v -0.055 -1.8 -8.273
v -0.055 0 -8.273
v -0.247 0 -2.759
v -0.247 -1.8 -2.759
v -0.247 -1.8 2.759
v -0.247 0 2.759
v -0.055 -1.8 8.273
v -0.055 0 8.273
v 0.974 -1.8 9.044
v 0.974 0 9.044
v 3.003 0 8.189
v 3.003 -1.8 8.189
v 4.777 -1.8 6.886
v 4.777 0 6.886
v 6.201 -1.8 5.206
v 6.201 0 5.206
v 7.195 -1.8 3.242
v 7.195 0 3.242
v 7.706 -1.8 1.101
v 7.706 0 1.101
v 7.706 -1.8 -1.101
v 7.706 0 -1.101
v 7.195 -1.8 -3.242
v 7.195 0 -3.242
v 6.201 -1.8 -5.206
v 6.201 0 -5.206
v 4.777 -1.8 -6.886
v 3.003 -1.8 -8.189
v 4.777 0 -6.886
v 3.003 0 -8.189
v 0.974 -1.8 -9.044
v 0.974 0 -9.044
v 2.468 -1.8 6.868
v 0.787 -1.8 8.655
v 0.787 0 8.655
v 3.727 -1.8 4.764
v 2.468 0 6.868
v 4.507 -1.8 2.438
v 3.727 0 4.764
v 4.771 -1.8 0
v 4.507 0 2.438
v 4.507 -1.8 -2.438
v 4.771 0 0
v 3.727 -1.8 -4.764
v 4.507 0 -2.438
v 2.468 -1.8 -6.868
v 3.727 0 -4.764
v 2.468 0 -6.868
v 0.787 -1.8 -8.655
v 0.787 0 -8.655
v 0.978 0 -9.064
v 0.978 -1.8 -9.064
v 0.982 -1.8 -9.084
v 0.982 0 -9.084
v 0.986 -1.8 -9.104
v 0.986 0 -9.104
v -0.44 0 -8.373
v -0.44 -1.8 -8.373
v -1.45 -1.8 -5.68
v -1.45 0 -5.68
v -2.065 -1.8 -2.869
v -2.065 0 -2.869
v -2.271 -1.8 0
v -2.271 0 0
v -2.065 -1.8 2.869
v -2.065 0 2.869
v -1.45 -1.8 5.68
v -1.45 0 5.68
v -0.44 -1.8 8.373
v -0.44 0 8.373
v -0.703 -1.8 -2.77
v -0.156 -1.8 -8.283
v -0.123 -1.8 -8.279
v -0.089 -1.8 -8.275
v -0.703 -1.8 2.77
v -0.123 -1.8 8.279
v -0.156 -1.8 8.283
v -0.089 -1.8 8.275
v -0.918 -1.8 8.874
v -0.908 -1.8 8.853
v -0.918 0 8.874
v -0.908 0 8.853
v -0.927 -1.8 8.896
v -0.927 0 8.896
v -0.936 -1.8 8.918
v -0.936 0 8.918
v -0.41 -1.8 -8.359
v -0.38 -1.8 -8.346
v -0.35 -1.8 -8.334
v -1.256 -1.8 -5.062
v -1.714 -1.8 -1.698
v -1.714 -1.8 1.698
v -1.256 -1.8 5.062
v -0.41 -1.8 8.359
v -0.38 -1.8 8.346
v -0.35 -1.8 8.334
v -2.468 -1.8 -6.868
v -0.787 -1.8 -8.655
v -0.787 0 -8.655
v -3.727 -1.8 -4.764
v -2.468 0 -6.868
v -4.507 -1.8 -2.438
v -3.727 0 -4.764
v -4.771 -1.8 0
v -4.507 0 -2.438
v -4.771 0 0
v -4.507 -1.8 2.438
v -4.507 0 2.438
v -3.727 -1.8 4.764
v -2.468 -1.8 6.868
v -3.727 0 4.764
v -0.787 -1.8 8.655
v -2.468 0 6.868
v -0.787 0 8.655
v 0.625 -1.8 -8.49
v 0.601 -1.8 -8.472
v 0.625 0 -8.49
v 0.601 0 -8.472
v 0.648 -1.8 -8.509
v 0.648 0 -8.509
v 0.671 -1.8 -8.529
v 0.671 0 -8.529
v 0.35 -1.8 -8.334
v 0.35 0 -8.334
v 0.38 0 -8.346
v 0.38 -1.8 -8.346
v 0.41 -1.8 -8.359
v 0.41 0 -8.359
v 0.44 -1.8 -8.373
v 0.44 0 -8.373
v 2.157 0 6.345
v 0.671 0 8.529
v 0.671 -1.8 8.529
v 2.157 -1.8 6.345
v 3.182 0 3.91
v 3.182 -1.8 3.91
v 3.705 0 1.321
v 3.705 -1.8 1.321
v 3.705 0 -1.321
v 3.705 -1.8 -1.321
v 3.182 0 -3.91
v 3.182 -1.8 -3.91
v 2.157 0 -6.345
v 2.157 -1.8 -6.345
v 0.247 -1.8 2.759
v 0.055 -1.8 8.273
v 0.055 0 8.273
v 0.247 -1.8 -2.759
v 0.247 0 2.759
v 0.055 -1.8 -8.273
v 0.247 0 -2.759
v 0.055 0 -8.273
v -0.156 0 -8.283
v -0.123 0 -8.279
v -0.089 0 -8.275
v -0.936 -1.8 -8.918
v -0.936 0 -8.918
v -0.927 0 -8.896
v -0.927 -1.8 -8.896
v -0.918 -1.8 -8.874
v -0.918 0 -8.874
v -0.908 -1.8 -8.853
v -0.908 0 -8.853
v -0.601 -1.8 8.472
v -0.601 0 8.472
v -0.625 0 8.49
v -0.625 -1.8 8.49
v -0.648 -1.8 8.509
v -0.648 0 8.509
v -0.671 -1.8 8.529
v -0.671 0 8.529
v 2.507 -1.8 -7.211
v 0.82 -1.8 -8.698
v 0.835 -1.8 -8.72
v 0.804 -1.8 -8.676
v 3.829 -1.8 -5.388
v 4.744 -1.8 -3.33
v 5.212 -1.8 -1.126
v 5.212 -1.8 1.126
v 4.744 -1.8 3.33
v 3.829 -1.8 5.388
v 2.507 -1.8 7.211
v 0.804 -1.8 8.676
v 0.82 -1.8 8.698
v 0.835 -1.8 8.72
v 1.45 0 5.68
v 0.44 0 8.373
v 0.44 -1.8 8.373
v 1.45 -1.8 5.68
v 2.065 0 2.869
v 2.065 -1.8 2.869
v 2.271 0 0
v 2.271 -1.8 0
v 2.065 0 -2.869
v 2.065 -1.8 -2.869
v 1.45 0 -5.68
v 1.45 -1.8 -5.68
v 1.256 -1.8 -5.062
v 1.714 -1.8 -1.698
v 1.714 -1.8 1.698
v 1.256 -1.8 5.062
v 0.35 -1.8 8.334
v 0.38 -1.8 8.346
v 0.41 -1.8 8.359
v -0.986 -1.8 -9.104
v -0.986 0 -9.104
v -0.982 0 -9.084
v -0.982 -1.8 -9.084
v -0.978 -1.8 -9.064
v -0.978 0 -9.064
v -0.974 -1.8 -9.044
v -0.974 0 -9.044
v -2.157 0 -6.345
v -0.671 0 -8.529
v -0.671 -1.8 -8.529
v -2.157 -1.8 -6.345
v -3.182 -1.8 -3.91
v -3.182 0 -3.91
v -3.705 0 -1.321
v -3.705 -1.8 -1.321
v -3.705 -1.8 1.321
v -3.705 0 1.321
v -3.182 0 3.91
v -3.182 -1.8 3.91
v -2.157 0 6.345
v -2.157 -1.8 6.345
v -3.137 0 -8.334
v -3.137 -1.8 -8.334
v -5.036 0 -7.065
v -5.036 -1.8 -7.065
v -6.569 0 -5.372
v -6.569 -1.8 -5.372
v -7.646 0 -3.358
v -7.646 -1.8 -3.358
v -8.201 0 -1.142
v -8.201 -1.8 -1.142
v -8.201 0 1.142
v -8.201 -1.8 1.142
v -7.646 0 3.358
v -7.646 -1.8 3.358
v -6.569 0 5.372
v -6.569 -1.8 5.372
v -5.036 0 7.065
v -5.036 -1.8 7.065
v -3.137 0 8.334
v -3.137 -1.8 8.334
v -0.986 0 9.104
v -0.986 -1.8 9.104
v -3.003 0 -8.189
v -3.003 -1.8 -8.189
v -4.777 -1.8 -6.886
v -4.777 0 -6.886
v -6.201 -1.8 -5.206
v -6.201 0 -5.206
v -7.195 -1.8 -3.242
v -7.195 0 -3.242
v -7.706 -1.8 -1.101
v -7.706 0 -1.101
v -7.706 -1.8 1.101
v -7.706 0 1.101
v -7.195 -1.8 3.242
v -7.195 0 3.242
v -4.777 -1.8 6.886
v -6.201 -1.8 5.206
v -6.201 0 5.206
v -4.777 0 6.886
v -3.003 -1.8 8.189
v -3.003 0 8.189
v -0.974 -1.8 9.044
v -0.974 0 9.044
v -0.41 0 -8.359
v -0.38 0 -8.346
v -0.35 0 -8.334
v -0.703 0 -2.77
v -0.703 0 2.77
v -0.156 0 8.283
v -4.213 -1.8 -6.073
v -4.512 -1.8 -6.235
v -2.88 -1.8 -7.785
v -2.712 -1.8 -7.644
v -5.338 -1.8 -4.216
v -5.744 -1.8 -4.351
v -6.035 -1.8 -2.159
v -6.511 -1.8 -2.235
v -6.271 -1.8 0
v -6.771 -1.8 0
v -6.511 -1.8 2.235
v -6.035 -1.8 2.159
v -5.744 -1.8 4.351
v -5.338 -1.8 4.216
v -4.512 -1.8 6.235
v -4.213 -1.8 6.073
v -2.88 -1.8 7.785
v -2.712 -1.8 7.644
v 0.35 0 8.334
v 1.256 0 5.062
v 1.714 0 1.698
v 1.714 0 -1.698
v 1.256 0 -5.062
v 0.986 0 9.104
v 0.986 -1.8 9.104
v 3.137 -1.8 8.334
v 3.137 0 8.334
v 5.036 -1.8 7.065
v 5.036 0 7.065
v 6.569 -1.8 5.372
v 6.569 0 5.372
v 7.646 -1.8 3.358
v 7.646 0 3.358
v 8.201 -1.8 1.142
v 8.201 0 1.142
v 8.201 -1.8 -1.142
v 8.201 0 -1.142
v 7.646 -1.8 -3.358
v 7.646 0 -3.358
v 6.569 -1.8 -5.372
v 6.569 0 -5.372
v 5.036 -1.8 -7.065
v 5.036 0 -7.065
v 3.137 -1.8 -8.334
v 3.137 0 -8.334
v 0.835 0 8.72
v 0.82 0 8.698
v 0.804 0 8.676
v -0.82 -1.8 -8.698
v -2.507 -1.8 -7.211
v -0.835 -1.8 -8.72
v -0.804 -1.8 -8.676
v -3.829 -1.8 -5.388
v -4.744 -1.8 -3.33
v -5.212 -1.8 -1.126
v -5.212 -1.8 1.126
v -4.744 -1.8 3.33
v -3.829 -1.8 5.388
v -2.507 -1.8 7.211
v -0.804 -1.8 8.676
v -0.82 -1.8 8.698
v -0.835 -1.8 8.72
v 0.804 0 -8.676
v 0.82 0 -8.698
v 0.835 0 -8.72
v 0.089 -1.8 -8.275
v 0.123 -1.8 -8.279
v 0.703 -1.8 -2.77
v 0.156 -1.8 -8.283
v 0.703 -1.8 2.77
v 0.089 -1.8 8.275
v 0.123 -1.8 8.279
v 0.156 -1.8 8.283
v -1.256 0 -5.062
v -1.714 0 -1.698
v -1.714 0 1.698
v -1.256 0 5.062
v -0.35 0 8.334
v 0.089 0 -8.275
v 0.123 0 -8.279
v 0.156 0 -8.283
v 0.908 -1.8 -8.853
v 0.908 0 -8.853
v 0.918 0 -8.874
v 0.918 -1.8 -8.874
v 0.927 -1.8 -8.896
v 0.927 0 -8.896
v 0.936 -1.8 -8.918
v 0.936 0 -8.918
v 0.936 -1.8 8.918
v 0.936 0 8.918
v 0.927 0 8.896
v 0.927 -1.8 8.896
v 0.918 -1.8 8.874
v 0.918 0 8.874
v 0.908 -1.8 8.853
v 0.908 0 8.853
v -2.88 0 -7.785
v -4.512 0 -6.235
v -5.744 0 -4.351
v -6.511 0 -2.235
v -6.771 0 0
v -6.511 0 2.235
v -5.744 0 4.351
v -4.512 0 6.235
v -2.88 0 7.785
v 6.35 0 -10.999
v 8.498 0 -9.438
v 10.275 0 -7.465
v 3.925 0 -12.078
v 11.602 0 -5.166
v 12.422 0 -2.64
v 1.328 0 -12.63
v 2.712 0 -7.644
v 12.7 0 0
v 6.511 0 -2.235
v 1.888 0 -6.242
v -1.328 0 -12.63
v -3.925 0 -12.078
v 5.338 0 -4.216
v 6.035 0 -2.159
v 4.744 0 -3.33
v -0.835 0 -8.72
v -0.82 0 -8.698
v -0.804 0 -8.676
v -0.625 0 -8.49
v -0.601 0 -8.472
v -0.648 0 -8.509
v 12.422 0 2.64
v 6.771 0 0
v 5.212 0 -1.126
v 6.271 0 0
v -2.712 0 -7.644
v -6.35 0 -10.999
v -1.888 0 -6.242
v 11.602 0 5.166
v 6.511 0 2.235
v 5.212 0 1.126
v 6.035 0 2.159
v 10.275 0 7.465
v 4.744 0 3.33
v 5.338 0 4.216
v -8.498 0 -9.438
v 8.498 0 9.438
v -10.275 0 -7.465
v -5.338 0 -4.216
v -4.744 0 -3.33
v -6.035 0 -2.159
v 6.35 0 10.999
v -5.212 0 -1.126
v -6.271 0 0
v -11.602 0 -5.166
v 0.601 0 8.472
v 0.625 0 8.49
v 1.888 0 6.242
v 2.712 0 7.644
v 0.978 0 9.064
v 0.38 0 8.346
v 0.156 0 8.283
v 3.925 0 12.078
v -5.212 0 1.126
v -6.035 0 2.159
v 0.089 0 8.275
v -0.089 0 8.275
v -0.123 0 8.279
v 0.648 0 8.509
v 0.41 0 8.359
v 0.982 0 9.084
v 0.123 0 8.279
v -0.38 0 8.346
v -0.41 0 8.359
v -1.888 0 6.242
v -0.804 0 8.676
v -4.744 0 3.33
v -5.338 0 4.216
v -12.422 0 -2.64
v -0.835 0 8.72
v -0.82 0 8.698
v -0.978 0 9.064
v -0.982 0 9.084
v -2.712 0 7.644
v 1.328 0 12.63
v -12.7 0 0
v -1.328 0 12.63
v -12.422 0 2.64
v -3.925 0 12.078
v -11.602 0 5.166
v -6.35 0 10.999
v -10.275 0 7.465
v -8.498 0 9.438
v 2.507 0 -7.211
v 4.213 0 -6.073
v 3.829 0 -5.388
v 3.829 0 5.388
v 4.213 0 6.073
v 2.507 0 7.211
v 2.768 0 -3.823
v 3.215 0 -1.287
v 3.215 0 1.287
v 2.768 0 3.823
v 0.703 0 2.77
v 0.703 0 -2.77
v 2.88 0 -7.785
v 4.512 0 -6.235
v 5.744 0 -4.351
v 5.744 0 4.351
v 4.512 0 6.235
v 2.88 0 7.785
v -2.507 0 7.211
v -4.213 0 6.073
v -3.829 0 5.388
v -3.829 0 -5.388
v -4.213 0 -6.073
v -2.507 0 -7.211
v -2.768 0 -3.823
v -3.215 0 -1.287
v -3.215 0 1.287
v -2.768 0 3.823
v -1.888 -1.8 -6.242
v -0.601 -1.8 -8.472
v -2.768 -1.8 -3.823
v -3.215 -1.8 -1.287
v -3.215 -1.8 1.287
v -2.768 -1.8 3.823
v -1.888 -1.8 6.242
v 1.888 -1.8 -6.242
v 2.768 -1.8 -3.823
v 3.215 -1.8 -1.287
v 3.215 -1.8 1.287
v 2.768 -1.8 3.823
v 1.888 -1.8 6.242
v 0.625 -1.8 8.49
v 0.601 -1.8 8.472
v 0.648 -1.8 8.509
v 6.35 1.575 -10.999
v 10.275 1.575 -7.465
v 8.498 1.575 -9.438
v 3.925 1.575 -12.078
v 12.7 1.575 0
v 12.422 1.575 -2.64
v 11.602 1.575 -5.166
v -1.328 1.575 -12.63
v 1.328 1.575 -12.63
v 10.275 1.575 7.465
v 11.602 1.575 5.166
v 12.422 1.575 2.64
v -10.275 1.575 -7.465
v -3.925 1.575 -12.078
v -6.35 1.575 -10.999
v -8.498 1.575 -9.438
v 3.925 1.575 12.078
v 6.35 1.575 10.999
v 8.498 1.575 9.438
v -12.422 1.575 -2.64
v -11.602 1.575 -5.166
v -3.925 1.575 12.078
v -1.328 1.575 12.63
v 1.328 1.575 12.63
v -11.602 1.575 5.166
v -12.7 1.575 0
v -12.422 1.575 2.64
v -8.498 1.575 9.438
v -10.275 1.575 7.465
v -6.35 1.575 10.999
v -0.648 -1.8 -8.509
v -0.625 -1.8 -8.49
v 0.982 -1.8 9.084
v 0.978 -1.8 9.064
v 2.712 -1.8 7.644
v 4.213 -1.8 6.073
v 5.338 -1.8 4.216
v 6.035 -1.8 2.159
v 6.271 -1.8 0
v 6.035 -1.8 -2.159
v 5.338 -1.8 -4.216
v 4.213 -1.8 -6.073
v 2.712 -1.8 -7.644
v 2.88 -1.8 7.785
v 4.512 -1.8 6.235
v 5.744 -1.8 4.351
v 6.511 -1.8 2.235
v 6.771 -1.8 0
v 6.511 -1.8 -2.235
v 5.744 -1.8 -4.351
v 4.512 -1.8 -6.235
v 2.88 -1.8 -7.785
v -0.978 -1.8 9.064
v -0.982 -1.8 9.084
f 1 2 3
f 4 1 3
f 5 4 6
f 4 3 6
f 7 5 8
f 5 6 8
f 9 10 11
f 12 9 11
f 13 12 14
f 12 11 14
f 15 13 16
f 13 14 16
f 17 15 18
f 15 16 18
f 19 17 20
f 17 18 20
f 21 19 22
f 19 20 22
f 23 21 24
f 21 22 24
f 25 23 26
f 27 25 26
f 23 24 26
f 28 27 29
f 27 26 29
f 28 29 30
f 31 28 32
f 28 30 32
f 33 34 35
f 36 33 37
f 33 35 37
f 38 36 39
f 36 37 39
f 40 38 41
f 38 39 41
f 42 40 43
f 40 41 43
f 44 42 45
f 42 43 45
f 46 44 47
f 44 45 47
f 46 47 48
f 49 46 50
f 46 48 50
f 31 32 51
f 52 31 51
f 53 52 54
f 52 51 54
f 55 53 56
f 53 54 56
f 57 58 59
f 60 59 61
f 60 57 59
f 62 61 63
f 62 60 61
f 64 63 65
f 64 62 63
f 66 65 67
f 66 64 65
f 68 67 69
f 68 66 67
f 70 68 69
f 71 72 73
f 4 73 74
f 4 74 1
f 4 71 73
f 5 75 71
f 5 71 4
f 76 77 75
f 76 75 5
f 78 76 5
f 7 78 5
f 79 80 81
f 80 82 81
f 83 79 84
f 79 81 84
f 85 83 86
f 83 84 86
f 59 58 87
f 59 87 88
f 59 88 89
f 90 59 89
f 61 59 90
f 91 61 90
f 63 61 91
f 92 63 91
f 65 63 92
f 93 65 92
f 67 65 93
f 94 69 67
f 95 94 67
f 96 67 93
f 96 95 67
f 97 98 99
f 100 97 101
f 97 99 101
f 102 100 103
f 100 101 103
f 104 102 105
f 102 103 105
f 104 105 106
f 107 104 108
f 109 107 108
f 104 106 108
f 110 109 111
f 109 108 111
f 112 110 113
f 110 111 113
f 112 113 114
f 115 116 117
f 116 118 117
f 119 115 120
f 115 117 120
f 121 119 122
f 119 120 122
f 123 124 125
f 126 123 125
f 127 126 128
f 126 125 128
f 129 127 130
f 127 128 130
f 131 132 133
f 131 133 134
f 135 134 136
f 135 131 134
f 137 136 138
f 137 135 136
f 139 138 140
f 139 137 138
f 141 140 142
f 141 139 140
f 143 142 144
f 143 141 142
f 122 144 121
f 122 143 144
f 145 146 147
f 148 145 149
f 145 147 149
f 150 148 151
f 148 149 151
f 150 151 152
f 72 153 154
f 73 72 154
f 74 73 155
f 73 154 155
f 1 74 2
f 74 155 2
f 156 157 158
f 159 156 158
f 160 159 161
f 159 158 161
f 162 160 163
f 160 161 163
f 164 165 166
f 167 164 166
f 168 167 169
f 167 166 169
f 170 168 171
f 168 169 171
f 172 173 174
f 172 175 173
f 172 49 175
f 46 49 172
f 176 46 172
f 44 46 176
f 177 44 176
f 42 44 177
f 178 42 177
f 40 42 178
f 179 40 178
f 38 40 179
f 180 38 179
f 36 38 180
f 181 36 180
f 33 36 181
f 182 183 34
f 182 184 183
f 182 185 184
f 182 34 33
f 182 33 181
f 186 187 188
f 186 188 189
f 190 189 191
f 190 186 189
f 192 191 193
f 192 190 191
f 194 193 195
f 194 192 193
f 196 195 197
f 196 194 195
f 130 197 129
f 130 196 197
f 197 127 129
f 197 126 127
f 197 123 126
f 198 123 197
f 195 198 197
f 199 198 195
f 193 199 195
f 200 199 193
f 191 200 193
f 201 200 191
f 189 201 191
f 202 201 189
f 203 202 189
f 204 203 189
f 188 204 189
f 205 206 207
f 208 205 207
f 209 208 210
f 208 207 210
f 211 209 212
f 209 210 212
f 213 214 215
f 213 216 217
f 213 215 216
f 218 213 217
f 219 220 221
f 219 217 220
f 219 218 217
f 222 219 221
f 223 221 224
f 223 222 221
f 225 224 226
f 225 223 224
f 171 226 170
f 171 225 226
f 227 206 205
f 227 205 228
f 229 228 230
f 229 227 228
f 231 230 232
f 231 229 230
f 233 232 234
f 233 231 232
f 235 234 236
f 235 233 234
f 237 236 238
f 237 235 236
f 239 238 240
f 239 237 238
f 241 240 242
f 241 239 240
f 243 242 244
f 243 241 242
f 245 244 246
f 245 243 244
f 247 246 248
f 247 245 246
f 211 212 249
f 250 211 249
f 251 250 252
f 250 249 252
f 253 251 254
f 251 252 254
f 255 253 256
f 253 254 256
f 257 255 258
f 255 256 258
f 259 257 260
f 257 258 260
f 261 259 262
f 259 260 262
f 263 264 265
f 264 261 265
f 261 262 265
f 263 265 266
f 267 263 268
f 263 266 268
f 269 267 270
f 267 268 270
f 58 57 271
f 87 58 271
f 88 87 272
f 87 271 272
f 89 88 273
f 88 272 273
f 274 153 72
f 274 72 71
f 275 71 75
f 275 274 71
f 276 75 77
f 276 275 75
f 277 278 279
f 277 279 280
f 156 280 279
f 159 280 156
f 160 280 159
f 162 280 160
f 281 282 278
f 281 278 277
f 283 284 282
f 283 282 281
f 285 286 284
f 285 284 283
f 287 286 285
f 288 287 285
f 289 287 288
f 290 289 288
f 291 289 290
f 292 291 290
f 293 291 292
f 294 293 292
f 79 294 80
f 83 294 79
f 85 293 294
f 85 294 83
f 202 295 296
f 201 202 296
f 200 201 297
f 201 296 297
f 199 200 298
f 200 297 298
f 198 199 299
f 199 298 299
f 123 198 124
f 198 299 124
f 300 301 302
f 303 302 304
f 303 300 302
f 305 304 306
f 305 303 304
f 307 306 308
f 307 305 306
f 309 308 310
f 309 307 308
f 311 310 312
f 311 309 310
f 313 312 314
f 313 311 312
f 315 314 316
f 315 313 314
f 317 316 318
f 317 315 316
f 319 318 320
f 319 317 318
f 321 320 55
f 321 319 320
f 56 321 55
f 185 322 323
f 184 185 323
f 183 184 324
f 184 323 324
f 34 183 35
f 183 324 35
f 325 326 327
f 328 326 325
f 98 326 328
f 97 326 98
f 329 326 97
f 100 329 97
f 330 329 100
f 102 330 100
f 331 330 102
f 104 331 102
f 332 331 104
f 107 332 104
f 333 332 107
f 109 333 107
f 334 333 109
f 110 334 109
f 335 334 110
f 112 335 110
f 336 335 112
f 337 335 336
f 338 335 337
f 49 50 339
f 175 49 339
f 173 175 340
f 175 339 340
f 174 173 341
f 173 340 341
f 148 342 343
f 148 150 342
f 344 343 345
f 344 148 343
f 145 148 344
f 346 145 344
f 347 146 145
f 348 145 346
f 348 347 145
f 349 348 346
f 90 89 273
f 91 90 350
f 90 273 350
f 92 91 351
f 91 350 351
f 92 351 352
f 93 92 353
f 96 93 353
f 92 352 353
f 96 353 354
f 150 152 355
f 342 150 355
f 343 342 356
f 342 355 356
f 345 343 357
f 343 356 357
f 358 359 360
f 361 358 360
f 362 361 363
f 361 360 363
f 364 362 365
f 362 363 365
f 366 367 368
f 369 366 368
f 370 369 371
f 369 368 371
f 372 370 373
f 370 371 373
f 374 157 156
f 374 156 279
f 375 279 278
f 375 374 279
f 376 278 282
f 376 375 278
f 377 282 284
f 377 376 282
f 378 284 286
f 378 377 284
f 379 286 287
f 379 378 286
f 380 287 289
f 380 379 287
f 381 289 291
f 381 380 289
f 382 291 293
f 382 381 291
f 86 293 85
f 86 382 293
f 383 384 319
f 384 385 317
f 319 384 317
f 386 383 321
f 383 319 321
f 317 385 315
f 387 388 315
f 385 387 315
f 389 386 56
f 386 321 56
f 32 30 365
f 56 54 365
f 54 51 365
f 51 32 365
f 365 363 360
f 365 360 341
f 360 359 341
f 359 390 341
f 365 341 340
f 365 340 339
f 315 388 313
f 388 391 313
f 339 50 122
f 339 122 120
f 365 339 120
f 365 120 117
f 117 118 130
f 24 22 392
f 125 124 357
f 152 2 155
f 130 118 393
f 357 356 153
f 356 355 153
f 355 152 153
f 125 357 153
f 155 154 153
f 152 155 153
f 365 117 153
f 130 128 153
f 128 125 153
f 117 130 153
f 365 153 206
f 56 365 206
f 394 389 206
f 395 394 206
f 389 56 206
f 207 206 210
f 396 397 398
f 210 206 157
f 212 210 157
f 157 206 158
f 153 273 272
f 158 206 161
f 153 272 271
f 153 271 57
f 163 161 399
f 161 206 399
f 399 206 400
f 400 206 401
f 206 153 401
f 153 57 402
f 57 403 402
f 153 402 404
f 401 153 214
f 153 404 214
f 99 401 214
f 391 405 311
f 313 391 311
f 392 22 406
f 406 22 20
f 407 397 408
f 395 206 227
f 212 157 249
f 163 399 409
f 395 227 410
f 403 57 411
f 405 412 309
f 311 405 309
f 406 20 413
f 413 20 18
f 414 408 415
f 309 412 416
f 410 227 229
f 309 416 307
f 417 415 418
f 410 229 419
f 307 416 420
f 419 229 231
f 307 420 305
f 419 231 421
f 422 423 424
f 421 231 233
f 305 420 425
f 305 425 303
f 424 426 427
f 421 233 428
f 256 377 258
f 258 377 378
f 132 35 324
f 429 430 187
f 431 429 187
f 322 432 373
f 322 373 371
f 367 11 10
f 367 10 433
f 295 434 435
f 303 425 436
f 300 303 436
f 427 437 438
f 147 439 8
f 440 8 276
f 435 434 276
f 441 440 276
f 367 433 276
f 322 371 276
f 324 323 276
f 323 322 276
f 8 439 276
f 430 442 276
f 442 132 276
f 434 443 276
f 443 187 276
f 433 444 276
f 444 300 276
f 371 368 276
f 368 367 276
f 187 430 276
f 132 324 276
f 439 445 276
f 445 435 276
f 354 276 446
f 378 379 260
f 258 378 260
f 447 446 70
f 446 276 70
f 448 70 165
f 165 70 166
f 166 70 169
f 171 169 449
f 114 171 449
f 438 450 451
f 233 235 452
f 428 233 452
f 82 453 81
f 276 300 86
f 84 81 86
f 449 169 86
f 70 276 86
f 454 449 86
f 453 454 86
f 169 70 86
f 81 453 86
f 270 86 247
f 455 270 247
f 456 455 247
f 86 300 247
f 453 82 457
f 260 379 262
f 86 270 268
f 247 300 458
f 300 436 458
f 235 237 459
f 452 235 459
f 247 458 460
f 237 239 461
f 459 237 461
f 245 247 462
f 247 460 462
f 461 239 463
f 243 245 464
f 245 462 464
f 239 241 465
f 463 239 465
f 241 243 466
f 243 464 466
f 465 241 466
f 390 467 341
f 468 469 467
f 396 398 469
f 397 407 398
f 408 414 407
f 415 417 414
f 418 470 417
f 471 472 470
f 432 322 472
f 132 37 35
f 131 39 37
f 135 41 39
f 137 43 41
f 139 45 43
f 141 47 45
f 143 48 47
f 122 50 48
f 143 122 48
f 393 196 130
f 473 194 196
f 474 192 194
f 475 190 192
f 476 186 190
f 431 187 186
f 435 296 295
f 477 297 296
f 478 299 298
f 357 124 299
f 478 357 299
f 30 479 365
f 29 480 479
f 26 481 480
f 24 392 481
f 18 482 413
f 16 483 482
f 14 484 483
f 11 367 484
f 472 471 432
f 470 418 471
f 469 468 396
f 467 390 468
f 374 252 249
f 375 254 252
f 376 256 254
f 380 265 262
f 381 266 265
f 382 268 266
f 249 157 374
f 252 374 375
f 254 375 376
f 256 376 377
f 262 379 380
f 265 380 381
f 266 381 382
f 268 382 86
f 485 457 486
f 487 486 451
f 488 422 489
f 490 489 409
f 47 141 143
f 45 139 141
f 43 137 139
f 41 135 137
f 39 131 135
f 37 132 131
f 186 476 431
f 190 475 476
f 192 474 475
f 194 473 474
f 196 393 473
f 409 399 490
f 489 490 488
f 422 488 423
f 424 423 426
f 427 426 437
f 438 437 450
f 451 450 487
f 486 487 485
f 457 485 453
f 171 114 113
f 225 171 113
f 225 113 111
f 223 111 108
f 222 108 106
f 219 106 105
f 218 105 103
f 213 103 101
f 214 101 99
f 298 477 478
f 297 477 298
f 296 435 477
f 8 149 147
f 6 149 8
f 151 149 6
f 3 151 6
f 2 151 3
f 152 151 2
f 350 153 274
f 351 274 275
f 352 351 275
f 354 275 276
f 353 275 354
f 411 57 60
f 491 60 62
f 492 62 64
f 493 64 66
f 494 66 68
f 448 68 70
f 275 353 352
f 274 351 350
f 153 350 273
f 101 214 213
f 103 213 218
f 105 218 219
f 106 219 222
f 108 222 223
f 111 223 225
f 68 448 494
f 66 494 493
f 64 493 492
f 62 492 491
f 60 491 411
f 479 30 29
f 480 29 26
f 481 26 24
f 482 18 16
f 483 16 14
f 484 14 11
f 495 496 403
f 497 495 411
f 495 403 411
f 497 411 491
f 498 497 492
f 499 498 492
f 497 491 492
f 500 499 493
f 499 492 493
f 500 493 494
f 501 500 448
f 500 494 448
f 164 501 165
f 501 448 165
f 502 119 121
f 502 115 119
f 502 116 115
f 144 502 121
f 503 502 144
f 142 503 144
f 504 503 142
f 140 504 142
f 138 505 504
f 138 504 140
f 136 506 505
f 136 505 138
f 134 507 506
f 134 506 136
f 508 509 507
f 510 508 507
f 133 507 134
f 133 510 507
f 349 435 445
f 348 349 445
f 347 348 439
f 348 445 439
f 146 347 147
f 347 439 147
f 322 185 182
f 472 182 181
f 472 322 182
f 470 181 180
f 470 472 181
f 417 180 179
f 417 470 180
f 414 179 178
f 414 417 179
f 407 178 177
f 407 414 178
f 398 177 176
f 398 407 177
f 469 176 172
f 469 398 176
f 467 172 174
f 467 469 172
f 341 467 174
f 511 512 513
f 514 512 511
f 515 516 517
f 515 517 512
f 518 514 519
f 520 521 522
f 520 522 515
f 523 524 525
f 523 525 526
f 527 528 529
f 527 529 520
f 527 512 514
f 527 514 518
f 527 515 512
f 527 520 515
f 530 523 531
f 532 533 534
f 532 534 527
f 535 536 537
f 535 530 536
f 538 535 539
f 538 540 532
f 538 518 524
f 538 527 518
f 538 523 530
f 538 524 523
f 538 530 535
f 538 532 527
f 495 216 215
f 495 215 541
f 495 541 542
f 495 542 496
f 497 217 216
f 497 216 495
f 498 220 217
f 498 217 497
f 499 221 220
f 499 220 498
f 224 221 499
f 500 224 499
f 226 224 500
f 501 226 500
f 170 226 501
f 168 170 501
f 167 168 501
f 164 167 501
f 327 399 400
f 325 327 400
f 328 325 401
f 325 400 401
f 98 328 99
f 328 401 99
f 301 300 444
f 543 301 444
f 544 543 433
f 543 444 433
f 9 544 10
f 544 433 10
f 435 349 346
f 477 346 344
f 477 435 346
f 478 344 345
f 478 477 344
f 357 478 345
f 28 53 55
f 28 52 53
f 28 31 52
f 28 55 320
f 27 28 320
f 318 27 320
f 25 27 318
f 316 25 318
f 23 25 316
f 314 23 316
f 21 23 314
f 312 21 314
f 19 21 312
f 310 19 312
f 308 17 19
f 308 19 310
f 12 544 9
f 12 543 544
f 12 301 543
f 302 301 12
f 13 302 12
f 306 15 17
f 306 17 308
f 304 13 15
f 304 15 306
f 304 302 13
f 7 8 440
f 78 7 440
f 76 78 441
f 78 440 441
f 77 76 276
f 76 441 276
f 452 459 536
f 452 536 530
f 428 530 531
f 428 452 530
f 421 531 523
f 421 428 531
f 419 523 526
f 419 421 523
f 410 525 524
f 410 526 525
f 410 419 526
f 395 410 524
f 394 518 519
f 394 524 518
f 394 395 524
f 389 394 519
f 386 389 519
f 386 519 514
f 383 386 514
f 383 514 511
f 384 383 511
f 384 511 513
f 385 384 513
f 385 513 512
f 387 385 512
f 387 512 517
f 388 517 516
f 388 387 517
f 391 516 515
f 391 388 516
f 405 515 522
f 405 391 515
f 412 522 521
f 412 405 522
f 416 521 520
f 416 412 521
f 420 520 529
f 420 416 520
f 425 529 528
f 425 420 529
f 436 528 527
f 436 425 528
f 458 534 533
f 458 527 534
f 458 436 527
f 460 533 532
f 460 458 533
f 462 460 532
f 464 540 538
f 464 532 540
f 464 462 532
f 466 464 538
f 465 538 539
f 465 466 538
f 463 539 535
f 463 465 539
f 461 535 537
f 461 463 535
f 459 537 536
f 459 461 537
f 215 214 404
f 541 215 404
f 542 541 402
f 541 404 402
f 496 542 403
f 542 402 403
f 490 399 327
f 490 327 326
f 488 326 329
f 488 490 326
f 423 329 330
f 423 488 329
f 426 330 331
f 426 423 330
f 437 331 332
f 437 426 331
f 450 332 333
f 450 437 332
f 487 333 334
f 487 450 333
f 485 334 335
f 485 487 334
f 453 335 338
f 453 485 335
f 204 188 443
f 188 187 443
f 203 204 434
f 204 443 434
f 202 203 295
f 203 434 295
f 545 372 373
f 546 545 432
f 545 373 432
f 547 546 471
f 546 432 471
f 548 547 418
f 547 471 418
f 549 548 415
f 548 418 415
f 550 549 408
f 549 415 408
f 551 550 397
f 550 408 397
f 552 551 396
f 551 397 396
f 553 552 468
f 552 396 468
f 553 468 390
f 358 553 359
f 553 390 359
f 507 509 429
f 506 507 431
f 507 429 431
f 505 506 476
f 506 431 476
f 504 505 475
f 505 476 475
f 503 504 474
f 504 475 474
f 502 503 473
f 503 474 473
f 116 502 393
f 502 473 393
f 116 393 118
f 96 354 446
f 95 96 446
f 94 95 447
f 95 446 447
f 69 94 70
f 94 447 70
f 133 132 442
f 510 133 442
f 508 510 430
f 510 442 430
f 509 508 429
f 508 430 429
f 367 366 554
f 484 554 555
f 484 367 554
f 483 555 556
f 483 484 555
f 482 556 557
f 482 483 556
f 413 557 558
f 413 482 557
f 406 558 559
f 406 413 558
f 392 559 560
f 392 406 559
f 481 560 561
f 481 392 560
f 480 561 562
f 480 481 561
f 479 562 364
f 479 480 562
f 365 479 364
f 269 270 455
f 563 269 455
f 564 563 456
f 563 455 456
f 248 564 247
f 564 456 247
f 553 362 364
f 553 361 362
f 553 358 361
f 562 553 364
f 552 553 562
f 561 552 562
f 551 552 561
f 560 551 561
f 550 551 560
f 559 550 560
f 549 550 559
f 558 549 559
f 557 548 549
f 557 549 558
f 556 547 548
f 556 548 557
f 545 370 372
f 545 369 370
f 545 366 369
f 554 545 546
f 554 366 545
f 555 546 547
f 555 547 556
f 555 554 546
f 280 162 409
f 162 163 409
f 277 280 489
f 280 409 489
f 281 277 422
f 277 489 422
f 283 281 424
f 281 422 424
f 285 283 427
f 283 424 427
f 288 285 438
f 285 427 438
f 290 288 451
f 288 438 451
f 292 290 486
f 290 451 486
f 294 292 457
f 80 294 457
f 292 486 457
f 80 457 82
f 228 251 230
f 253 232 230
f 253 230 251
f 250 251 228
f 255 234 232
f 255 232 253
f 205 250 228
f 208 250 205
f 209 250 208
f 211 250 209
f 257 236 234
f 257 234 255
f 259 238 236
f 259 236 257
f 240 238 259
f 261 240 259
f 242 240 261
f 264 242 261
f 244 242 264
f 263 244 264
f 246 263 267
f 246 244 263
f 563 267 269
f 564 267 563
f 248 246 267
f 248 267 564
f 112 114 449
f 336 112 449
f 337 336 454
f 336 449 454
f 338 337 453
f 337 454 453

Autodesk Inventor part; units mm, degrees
ref_plane "YZ Plane" through (0, 0, 0) normal (1, 0, 0) x (0, 1, 0)
ref_plane "XZ Plane" through (0, 0, 0) normal (0, 1, 0) x (-1, 0, 0)
ref_plane "XY Plane" through (0, 0, 0) normal (0, 0, 1) x (1, 0, 0)
sketch "Sketch1" plane through (0, 0, 0) normal (0, 1, 0) x (-1, 0, 0)
  circle A0 centre (0, 0) radius 12.7
  dimension "d0" = 25.4
extrude "Extrusion1" add sketch "Sketch1" along normal blind 1.5748
sketch "Sketch2" plane through (0, 0, 0) normal (0, -1, 0) x (1, 0, 0)
  circle A0 centre (0, 0) radius 9.271
  line L0 (0, -9.271) -> (0, -7.271)
  line L1 (9.271, 0) -> (8.271, 0)
  line L2 (8.271, 0) -> (7.771, 0)
  line L3 (7.771, 0) -> (6.771, 0)
  line L4 (6.771, 0) -> (6.271, 0)
  line L5 (6.271, 0) -> (5.271, 0)
  line L6 (5.271, 0) -> (4.771, 0)
  line L7 (4.771, 0) -> (3.771, 0)
  line L8 (3.771, 0) -> (3.271, 0)
  line L9 (3.271, 0) -> (2.271, 0)
  line L10 (2.271, 0) -> (1.771, 0)
  line L11 (1.771, 0) -> (0.771, 0)
  line L12 (0.771, 0) -> (0.271, 0)
  line L13 (0, 9.271) -> (0, 7.271)
  arc A1 (0, -9.271) -> (0, 9.271) centre (-158.4465, 0) ccw
  arc A2 (0, -9.271) -> (0, 9.271) centre (-55.3547, 0) ccw
  arc A3 (0, -9.271) -> (0, 9.271) centre (-23.3809, 0) ccw
  arc A4 (0, -9.271) -> (0, 9.271) centre (-17.7882, 0) ccw
  arc A5 (0, -9.271) -> (0, 9.271) centre (-11.5029, 0) ccw
  arc A6 (0, -9.271) -> (0, 9.271) centre (-9.5109, 0) ccw
  arc A7 (0, -9.271) -> (0, 9.271) centre (-6.6222, 0) ccw
  arc A8 (0, -9.271) -> (0, 9.271) centre (-5.5177, 0) ccw
  arc A9 (0, -9.271) -> (0, 9.271) centre (-3.7176, 0) ccw
  arc A10 (0, -9.271) -> (0, 9.271) centre (-2.9615, 0) ccw
  arc A11 (0, -9.271) -> (0, 9.271) centre (-1.6448, 0) ccw
  arc A12 (0, -9.271) -> (0, 9.271) centre (-1.0605, 0) ccw
  circle A13 centre (0, 9.271) radius 1
  circle A14 centre (0, -9.271) radius 1
  point P0 (0.974, -9.0443)
  point P1 (0.986, -9.1043)
  point P2 (0.986, 9.1043)
  point P3 (0.974, 9.0443)
  point P4 (0.9357, 8.9182)
  point P5 (0.9084, 8.8528)
  point P6 (0.9084, -8.8528)
  point P7 (0.9357, -8.9182)
  point P8 (0.7874, -8.6546)
  point P9 (0.8347, -8.7203)
  point P10 (0.8347, 8.7203)
  point P11 (0.7874, 8.6546)
  point P12 (0.6008, -8.4716)
  point P13 (0.6706, -8.5292)
  point P14 (0.6706, 8.5292)
  point P15 (0.6008, 8.4716)
  point P16 (0.4399, 8.373)
  point P17 (0.35, 8.3343)
  point P18 (0.35, -8.3343)
  point P19 (0.4399, -8.373)
  point P20 (0.0553, -8.2725)
  point P21 (0.1564, -8.2833)
  point P22 (0.1564, 8.2833)
  point P23 (0.0553, 8.2725)
  dimension "d3" = 18.542
  dimension "d4" = 2
  dimension "d5" = 1
  dimension "d6" = 0.5
  dimension "d7" = 1
  dimension "d8" = 0.5
  dimension "d9" = 1
  dimension "d10" = 0.5
  dimension "d11" = 1
  dimension "d12" = 0.5
  dimension "d13" = 1
  dimension "d14" = 0.5
  dimension "d15" = 1
  dimension "d16" = 0.5
  dimension "d17" = 2
  dimension "d18" = 2
  dimension "d19" = 2
extrude "Extrusion2" add sketch "Sketch2" along normal blind 1.8 contours A12 A14 A11 L2 | L2 A11 A13 A12 | A13 A2 L12 A1 | A13 A4 L10 A3 | A13 A6 L8 A5 | A13 A8 L6 A7 | A13 A10 L4 A9 | A1 L12 A2 A14 | A3 L10 A4 A14 | A5 L8 A6 A14 | A7 L6 A8 A14 | A9 L4 A10 A14
mirror "Mirror1" about plane through (0, 0, 0) normal (1, 0, 0) of "Extrusion2"
properties part number "flow director r1"
